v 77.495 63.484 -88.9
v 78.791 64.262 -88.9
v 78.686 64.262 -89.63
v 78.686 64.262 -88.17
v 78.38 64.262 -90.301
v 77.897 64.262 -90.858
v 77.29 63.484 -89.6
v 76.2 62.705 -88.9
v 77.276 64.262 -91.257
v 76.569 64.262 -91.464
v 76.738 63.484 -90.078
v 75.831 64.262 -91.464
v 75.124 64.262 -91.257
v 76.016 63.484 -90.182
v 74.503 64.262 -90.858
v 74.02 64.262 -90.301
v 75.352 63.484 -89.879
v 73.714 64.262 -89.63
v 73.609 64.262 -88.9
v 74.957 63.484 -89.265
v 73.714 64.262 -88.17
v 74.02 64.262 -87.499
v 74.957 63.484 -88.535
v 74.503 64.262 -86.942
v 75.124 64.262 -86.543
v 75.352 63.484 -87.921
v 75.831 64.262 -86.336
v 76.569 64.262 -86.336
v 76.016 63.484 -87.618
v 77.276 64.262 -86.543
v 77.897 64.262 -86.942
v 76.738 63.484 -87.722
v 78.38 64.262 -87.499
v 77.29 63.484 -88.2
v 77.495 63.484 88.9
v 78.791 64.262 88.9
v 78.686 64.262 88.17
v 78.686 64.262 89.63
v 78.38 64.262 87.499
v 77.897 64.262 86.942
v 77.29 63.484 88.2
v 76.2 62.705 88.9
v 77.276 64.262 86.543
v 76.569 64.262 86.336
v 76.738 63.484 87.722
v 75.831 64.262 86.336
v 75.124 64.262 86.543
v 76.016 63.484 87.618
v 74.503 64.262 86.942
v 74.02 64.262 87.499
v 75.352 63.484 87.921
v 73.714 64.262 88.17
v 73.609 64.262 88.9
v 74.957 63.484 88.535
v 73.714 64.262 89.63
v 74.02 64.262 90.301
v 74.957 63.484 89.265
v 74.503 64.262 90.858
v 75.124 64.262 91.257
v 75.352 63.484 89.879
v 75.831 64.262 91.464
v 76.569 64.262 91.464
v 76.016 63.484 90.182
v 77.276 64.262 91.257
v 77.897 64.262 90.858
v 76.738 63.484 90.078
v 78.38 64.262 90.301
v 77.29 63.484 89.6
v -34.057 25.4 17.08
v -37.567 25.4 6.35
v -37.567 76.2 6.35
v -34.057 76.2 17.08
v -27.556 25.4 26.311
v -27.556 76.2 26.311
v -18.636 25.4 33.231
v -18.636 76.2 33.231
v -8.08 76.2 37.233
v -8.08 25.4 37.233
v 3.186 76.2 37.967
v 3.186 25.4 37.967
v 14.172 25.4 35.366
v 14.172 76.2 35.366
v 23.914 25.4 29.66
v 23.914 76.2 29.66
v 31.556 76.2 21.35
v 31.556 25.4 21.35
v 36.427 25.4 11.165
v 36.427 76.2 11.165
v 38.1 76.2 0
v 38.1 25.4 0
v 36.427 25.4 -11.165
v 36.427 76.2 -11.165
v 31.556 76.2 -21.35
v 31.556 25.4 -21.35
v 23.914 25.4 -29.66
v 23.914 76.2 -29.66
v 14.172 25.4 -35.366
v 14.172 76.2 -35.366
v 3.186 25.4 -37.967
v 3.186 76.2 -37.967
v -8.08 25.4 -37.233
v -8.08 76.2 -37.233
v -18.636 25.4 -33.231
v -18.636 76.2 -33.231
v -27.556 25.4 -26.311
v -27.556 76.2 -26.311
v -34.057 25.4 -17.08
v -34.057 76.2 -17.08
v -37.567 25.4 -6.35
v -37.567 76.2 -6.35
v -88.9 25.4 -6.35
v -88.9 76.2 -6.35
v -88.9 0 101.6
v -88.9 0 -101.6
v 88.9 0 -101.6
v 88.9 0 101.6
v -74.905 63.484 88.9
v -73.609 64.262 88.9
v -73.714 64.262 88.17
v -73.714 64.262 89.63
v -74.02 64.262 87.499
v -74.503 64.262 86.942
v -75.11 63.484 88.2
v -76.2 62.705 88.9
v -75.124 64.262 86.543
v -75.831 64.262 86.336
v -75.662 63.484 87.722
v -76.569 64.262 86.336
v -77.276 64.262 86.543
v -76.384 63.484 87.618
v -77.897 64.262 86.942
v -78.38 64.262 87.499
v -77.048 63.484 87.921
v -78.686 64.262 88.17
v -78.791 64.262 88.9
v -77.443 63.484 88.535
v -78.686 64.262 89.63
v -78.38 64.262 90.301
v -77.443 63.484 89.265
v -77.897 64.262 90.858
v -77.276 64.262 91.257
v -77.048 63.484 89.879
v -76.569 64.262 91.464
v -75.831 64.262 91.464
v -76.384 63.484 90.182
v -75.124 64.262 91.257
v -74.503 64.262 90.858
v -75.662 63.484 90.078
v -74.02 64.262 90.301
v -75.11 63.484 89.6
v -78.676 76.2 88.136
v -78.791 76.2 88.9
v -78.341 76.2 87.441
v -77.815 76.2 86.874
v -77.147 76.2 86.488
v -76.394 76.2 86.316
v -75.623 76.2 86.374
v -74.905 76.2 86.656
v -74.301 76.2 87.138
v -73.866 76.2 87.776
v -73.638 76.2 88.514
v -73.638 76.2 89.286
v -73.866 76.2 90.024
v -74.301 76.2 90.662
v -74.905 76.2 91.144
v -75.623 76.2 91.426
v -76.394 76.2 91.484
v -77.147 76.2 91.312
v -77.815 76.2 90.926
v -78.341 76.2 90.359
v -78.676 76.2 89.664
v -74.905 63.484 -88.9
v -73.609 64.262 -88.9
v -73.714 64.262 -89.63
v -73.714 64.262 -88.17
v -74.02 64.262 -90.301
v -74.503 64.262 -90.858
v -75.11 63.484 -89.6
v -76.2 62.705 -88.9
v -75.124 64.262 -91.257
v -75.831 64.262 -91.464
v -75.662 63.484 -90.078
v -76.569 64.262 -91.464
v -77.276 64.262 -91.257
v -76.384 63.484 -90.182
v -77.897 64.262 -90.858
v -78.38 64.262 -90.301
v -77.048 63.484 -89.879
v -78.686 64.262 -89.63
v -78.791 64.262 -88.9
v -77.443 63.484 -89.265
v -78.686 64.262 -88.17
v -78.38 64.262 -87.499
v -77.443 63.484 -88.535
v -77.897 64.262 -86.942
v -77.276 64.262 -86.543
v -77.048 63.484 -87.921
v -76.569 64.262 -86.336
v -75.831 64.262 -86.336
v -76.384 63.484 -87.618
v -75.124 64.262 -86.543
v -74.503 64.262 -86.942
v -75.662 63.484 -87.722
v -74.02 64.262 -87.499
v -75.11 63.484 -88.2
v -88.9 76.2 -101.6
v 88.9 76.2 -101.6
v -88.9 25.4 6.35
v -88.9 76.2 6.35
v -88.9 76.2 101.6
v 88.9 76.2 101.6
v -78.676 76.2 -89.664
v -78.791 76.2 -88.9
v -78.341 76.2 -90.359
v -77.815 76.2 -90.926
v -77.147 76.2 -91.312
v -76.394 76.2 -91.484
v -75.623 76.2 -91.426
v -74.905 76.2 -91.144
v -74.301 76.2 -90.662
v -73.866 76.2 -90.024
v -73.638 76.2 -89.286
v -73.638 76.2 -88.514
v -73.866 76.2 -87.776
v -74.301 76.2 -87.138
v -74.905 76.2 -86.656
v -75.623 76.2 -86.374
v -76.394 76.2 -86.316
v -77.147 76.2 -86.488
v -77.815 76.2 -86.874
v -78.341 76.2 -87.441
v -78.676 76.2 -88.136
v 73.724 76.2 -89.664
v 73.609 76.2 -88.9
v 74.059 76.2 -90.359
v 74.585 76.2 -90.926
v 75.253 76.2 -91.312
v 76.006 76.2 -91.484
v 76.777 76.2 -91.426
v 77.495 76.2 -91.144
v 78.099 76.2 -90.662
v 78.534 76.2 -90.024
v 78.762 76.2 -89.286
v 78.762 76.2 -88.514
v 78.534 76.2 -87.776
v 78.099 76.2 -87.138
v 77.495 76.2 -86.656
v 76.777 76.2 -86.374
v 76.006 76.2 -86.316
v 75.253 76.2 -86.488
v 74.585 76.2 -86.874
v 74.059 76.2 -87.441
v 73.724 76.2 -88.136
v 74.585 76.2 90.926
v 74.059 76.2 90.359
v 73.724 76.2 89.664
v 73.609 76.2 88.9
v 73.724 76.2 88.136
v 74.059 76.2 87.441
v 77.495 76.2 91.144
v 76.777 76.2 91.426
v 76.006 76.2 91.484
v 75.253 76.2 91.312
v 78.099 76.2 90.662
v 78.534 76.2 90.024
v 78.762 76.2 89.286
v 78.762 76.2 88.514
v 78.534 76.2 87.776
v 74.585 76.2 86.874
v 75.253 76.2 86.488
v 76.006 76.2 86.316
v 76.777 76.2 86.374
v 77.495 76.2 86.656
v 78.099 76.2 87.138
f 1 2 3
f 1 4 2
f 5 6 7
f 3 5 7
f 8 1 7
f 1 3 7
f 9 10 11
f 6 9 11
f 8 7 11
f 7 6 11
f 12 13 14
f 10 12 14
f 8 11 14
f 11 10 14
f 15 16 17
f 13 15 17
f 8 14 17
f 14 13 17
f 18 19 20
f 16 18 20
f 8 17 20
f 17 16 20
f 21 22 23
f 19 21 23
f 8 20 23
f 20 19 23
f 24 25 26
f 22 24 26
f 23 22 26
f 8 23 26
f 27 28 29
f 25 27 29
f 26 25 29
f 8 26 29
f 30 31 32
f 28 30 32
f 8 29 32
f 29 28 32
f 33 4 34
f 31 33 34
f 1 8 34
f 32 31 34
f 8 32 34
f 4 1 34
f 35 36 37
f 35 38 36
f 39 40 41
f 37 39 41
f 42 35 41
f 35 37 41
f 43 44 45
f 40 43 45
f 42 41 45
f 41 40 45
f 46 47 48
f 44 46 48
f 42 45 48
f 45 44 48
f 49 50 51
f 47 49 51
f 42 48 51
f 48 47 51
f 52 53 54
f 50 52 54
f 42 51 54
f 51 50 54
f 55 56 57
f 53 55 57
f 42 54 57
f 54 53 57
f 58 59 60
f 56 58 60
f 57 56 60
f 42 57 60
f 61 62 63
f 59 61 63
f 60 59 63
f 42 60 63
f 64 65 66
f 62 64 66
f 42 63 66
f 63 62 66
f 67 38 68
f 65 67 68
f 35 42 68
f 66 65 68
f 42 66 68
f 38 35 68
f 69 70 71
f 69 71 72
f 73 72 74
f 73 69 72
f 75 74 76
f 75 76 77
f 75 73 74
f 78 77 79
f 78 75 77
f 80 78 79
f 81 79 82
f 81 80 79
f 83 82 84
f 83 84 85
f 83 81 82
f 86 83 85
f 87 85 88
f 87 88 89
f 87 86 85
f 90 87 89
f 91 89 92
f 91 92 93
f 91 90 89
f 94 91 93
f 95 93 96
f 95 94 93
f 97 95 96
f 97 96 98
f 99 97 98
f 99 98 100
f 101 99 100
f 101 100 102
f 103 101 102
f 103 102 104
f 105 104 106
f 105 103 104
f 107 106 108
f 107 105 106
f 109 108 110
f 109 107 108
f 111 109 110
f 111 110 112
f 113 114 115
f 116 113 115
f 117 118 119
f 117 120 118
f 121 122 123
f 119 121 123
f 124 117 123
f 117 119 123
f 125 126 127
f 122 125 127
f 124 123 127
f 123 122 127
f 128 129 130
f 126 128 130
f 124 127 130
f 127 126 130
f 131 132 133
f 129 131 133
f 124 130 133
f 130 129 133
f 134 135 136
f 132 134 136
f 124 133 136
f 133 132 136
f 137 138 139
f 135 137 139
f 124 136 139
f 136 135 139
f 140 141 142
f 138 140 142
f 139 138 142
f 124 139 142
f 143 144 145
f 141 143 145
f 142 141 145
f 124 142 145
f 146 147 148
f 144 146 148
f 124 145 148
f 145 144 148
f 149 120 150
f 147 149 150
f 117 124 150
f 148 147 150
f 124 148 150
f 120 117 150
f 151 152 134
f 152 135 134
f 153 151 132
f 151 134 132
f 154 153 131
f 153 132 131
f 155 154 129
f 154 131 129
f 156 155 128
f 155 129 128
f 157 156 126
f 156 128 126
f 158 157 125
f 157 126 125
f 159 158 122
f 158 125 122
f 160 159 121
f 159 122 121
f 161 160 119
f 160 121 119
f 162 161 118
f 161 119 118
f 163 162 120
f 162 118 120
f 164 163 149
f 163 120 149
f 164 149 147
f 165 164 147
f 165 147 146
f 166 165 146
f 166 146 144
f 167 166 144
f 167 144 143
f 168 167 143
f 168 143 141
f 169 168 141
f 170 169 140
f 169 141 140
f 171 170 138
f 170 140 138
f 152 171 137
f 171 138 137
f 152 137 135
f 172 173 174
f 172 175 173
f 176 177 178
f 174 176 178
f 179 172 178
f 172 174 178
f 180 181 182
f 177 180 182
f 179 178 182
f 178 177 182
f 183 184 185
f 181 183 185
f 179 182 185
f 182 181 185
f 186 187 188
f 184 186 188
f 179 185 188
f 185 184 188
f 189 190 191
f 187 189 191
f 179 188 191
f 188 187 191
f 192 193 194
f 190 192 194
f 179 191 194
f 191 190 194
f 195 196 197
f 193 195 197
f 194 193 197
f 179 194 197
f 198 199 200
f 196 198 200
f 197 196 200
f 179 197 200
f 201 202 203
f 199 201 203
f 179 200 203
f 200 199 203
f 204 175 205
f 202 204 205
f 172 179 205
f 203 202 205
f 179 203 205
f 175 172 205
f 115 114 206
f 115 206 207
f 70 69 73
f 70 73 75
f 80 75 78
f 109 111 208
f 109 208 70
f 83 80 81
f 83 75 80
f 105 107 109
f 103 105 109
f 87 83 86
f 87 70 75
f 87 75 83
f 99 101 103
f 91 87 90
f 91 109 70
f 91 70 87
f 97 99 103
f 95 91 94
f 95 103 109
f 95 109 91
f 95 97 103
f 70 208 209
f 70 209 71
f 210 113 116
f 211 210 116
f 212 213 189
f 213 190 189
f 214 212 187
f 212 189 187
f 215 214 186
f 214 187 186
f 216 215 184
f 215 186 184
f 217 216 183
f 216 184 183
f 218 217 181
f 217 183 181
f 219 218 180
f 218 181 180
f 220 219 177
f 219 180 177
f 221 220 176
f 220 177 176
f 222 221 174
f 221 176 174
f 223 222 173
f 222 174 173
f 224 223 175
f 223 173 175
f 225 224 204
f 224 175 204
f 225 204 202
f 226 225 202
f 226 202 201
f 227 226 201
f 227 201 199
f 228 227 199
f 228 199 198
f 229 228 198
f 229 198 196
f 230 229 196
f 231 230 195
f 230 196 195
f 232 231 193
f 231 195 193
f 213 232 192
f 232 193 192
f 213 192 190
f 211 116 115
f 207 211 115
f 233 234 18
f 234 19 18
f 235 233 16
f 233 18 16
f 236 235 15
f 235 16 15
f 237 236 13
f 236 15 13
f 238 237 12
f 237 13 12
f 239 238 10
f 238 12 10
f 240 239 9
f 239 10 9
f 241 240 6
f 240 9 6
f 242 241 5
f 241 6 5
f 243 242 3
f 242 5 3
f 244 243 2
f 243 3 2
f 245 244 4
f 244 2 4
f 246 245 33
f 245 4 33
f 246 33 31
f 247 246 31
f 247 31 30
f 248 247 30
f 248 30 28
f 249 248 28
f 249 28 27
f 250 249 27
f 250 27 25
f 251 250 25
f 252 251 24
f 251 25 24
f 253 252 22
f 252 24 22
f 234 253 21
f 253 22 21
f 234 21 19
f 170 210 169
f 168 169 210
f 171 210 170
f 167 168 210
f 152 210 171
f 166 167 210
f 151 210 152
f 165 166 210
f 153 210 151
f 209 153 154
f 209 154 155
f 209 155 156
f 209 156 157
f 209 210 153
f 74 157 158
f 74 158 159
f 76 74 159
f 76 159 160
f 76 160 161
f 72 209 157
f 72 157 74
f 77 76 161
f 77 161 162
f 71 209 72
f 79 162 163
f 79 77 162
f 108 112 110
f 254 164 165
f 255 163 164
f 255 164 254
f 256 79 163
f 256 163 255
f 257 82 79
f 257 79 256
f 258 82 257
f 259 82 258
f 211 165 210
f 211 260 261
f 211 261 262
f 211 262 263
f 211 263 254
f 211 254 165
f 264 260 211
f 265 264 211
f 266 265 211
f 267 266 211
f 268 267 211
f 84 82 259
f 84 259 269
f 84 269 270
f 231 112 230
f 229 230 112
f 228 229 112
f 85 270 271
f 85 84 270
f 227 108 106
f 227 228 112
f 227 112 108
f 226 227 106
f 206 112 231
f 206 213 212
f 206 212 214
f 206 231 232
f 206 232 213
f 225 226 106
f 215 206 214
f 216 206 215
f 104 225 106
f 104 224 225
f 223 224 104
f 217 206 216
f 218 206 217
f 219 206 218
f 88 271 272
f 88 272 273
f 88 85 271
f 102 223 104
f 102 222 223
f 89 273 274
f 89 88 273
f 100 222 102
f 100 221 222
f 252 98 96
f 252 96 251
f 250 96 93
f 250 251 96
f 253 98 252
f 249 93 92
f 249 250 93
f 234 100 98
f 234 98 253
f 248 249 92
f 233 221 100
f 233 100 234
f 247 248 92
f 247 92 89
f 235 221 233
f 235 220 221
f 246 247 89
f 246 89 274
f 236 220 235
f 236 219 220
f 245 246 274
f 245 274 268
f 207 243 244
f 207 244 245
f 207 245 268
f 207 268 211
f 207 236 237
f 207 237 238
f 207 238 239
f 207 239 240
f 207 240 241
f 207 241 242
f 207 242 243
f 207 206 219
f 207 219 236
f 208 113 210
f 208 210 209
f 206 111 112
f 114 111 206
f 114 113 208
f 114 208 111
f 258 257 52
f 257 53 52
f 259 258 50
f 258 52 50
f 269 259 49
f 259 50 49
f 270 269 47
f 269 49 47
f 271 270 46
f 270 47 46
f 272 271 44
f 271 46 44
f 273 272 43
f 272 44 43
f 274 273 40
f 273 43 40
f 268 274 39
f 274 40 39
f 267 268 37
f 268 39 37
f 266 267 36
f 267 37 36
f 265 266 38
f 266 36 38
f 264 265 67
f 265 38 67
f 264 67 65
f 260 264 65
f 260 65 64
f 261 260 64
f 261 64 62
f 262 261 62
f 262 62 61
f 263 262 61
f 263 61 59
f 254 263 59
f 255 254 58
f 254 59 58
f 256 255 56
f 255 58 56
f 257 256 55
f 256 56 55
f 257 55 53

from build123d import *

# Parameters (mm, degrees)
SKETCH1_W                      = 177.8
SKETCH1_H                      = 203.2
BOSS_EXTRUDE1_DEPTH            = 76.2
F_6_0_204_DIAMETER_HOLE1_D     = 5.1816
F_6_0_204_DIAMETER_HOLE1_DEPTH = 11.938
F_6_0_204_DIAMETER_HOLE1_TIP   = 1.556709692
CUT_EXTRUDE1_START             = -50.8
CUT_EXTRUDE1_DEPTH             = 50.8


with BuildPart() as part:
    # Sketch1 → Boss-Extrude1 (new body)
    with BuildSketch(Plane(origin=(0, 0, 0), x_dir=(1, 0, 0), z_dir=(0, 1, 0))):
        Rectangle(SKETCH1_W, SKETCH1_H)
    extrude(amount=BOSS_EXTRUDE1_DEPTH)

    # #6 (0.204) Diameter Hole1
    with Locations(Plane(origin=(0, 76.2, 0), x_dir=(1, 0, 0), z_dir=(0, 1, 0))):
        with Locations((76.2, 88.9), (76.2, -88.9), (-76.2, -88.9), (-76.2, 88.9)):
            Hole(F_6_0_204_DIAMETER_HOLE1_D / 2, depth=F_6_0_204_DIAMETER_HOLE1_DEPTH)
            with Locations((0, 0, -(F_6_0_204_DIAMETER_HOLE1_DEPTH + F_6_0_204_DIAMETER_HOLE1_TIP / 2))):  # 118° drill point
                Cone(0, F_6_0_204_DIAMETER_HOLE1_D / 2, F_6_0_204_DIAMETER_HOLE1_TIP, mode=Mode.SUBTRACT)

    # Sketch4 → Cut-Extrude1 (cut)
    with BuildSketch(Plane(origin=(0, 76.2, 0), x_dir=(1, 0, 0), z_dir=(0, 1, 0)).offset(CUT_EXTRUDE1_START)):
        with BuildLine():
            ThreePointArc((-37.567106623, -6.35), (38.1, 0), (-37.567106623, 6.35))
            Line((-37.567106623, 6.35), (-88.9, 6.35))
            Line((-88.9, 6.35), (-88.9, -6.35))
            Line((-88.9, -6.35), (-37.567106623, -6.35))
        make_face()
    extrude(amount=CUT_EXTRUDE1_DEPTH, mode=Mode.SUBTRACT)


solid = part.part
